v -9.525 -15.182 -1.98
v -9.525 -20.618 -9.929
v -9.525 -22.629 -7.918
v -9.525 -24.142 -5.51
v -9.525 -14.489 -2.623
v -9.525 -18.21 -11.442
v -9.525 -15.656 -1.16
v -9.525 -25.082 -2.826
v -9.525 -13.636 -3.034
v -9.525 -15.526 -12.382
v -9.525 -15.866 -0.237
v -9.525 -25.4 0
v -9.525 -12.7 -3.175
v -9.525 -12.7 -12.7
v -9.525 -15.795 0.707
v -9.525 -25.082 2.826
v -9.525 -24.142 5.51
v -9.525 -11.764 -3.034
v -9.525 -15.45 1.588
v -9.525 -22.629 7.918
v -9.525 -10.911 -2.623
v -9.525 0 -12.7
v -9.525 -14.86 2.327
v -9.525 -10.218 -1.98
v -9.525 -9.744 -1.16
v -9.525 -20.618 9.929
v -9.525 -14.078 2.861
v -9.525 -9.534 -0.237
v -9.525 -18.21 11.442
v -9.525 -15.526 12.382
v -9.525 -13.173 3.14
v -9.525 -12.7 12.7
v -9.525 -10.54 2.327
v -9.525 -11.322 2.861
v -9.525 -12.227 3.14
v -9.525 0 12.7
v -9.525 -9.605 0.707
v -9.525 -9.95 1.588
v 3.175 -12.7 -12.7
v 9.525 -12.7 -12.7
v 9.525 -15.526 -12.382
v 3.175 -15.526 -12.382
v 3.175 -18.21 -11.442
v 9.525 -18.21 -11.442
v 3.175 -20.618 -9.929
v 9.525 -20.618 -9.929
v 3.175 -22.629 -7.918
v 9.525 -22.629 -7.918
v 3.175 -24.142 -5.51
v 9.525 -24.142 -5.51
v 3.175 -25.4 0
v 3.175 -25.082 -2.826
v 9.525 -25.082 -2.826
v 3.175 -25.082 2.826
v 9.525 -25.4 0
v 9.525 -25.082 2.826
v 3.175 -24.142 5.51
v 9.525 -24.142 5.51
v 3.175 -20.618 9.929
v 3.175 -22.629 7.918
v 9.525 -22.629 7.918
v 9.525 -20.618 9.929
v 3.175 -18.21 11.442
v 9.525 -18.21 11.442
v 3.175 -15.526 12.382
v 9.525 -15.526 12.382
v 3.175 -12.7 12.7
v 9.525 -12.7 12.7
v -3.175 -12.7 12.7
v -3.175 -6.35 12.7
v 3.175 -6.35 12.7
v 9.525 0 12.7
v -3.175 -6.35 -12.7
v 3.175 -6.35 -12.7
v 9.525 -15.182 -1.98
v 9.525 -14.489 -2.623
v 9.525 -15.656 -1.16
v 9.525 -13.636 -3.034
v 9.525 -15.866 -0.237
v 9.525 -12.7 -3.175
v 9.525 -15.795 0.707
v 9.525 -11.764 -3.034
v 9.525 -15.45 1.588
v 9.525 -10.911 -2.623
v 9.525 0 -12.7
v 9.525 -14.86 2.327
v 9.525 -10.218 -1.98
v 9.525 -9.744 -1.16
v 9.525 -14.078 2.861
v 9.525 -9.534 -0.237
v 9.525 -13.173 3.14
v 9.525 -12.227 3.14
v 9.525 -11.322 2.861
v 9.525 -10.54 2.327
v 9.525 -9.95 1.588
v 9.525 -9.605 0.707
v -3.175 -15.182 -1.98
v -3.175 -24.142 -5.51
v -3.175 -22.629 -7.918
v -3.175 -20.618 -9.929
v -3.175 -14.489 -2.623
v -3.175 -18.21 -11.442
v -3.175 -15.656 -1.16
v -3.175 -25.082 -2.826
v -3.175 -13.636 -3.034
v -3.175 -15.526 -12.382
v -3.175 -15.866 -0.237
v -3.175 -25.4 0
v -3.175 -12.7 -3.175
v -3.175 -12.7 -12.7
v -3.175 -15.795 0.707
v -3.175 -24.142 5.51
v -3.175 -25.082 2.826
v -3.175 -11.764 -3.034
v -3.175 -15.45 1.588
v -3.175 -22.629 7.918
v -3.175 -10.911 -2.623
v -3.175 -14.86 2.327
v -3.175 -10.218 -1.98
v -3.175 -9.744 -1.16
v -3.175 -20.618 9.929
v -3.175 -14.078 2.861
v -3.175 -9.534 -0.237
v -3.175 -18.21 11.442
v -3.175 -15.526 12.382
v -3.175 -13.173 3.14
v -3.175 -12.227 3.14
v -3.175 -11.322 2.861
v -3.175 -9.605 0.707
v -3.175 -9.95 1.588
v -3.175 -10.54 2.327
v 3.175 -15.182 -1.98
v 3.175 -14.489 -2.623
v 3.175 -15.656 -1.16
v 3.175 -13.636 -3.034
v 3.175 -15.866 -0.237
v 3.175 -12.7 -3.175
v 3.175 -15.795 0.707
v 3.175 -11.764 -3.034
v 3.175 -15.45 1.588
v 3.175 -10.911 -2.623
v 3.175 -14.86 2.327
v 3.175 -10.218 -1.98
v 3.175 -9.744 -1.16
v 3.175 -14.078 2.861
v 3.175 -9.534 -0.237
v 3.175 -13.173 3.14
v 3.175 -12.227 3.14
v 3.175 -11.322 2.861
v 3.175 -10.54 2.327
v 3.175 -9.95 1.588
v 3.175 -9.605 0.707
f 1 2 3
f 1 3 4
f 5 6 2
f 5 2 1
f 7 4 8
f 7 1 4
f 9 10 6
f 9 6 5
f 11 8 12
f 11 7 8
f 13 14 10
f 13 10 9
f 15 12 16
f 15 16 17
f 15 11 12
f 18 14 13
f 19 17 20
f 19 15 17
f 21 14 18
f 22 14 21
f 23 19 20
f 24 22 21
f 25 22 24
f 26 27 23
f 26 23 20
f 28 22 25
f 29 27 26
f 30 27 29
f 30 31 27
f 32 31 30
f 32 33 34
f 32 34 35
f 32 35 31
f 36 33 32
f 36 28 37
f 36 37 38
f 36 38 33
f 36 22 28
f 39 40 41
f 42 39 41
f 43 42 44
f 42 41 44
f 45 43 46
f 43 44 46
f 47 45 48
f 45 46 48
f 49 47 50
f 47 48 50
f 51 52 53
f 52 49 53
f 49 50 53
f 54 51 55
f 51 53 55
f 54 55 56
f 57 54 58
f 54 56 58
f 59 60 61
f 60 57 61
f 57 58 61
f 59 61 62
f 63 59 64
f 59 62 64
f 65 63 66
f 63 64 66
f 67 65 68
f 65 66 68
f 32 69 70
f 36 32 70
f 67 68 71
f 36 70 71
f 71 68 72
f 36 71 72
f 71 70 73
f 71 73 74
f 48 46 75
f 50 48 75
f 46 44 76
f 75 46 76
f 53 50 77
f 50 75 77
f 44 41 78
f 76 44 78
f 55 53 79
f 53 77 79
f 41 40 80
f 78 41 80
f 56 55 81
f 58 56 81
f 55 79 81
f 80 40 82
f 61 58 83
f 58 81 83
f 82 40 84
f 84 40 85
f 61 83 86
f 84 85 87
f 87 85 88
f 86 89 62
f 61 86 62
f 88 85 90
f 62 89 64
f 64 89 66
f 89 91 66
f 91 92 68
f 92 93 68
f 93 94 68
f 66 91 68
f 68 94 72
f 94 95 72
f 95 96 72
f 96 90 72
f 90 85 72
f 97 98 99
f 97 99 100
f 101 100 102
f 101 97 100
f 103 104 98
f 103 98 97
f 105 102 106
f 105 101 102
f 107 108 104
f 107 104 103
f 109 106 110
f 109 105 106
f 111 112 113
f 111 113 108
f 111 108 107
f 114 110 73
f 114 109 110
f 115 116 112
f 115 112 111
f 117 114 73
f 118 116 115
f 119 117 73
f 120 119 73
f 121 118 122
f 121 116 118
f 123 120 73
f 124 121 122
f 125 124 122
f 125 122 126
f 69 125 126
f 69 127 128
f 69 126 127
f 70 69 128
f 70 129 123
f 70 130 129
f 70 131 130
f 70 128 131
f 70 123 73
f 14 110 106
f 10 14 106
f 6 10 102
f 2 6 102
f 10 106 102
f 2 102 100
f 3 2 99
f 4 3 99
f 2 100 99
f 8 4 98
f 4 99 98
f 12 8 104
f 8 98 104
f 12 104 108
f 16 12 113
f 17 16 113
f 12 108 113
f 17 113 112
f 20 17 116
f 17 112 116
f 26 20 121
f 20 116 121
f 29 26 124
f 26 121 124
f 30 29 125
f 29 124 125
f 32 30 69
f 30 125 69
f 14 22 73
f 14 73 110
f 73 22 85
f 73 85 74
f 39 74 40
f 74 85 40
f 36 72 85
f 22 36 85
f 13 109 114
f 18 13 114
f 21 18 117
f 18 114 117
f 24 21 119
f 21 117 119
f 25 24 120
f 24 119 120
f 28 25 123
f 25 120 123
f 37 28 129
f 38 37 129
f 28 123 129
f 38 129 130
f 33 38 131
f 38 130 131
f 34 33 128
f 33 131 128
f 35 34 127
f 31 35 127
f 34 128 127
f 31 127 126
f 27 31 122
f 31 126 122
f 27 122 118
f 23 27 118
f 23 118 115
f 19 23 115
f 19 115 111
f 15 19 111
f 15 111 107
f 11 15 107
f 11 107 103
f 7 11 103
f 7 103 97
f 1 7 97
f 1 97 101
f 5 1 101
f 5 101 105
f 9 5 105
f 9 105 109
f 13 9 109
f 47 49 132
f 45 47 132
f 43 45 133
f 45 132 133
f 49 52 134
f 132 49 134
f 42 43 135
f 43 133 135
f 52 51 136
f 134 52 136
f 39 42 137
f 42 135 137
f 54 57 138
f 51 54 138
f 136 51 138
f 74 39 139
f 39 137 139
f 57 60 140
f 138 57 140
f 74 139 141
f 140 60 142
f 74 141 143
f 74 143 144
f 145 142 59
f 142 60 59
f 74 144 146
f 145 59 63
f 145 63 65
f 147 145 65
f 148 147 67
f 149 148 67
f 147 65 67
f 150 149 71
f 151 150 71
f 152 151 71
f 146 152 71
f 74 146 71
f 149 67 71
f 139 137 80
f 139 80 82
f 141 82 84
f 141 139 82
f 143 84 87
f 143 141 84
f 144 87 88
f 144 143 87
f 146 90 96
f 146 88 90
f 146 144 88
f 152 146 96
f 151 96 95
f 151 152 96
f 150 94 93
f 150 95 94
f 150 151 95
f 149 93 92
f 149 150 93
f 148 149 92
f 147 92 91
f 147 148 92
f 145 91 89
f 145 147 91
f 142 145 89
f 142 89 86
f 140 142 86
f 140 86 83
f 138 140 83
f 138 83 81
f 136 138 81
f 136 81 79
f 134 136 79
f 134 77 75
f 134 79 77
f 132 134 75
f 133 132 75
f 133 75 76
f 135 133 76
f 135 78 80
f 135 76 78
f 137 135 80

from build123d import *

# Parameters (mm, degrees)
MOUNT_DEPTH                      = 9.525
SKETCH2_W                        = 6.35
SKETCH2_H                        = 19.05
CENTER_CUTOUT_FOR_RIB_DEPTH      = 13.7
CENTER_CUTOUT_FOR_RIB_DEPTH_BACK = 13.7
SKETCH3_R                        = 3.175
PIN_HOLE_DEPTH                   = 10.525
PIN_HOLE_DEPTH_BACK              = 10.525


with BuildPart() as part:
    # Sketch1 → mount (new body, symmetric)
    with BuildSketch(Plane(origin=(0, 0, 0), x_dir=(0, 0, -1), z_dir=(1, 0, 0))):
        with BuildLine():
            Line((12.7, 0), (12.7, -12.7))
            ThreePointArc((12.7, -12.7), (0, -25.4), (-12.7, -12.7))
            Line((-12.7, -12.7), (-12.7, 0))
            Line((-12.7, 0), (12.7, 0))
        make_face()
    extrude(amount=MOUNT_DEPTH, both=True)

    # Sketch2 → center cutout for rib (cut, two sides)
    with BuildSketch(Plane.XY) as center_cutout_for_rib_sk:
        with Locations((0, -15.875)):
            Rectangle(SKETCH2_W, SKETCH2_H)
    extrude(amount=CENTER_CUTOUT_FOR_RIB_DEPTH, mode=Mode.SUBTRACT)
    extrude(center_cutout_for_rib_sk.sketch, amount=-CENTER_CUTOUT_FOR_RIB_DEPTH_BACK, mode=Mode.SUBTRACT)

    # Sketch3 → pin hole (cut, two sides)
    with BuildSketch(Plane(origin=(0, 0, 0), x_dir=(0, 0, -1), z_dir=(1, 0, 0))) as pin_hole_sk:
        with Locations((0, -12.7)):
            Circle(SKETCH3_R)
    extrude(amount=PIN_HOLE_DEPTH, mode=Mode.SUBTRACT)
    extrude(pin_hole_sk.sketch, amount=-PIN_HOLE_DEPTH_BACK, mode=Mode.SUBTRACT)


solid = part.part
